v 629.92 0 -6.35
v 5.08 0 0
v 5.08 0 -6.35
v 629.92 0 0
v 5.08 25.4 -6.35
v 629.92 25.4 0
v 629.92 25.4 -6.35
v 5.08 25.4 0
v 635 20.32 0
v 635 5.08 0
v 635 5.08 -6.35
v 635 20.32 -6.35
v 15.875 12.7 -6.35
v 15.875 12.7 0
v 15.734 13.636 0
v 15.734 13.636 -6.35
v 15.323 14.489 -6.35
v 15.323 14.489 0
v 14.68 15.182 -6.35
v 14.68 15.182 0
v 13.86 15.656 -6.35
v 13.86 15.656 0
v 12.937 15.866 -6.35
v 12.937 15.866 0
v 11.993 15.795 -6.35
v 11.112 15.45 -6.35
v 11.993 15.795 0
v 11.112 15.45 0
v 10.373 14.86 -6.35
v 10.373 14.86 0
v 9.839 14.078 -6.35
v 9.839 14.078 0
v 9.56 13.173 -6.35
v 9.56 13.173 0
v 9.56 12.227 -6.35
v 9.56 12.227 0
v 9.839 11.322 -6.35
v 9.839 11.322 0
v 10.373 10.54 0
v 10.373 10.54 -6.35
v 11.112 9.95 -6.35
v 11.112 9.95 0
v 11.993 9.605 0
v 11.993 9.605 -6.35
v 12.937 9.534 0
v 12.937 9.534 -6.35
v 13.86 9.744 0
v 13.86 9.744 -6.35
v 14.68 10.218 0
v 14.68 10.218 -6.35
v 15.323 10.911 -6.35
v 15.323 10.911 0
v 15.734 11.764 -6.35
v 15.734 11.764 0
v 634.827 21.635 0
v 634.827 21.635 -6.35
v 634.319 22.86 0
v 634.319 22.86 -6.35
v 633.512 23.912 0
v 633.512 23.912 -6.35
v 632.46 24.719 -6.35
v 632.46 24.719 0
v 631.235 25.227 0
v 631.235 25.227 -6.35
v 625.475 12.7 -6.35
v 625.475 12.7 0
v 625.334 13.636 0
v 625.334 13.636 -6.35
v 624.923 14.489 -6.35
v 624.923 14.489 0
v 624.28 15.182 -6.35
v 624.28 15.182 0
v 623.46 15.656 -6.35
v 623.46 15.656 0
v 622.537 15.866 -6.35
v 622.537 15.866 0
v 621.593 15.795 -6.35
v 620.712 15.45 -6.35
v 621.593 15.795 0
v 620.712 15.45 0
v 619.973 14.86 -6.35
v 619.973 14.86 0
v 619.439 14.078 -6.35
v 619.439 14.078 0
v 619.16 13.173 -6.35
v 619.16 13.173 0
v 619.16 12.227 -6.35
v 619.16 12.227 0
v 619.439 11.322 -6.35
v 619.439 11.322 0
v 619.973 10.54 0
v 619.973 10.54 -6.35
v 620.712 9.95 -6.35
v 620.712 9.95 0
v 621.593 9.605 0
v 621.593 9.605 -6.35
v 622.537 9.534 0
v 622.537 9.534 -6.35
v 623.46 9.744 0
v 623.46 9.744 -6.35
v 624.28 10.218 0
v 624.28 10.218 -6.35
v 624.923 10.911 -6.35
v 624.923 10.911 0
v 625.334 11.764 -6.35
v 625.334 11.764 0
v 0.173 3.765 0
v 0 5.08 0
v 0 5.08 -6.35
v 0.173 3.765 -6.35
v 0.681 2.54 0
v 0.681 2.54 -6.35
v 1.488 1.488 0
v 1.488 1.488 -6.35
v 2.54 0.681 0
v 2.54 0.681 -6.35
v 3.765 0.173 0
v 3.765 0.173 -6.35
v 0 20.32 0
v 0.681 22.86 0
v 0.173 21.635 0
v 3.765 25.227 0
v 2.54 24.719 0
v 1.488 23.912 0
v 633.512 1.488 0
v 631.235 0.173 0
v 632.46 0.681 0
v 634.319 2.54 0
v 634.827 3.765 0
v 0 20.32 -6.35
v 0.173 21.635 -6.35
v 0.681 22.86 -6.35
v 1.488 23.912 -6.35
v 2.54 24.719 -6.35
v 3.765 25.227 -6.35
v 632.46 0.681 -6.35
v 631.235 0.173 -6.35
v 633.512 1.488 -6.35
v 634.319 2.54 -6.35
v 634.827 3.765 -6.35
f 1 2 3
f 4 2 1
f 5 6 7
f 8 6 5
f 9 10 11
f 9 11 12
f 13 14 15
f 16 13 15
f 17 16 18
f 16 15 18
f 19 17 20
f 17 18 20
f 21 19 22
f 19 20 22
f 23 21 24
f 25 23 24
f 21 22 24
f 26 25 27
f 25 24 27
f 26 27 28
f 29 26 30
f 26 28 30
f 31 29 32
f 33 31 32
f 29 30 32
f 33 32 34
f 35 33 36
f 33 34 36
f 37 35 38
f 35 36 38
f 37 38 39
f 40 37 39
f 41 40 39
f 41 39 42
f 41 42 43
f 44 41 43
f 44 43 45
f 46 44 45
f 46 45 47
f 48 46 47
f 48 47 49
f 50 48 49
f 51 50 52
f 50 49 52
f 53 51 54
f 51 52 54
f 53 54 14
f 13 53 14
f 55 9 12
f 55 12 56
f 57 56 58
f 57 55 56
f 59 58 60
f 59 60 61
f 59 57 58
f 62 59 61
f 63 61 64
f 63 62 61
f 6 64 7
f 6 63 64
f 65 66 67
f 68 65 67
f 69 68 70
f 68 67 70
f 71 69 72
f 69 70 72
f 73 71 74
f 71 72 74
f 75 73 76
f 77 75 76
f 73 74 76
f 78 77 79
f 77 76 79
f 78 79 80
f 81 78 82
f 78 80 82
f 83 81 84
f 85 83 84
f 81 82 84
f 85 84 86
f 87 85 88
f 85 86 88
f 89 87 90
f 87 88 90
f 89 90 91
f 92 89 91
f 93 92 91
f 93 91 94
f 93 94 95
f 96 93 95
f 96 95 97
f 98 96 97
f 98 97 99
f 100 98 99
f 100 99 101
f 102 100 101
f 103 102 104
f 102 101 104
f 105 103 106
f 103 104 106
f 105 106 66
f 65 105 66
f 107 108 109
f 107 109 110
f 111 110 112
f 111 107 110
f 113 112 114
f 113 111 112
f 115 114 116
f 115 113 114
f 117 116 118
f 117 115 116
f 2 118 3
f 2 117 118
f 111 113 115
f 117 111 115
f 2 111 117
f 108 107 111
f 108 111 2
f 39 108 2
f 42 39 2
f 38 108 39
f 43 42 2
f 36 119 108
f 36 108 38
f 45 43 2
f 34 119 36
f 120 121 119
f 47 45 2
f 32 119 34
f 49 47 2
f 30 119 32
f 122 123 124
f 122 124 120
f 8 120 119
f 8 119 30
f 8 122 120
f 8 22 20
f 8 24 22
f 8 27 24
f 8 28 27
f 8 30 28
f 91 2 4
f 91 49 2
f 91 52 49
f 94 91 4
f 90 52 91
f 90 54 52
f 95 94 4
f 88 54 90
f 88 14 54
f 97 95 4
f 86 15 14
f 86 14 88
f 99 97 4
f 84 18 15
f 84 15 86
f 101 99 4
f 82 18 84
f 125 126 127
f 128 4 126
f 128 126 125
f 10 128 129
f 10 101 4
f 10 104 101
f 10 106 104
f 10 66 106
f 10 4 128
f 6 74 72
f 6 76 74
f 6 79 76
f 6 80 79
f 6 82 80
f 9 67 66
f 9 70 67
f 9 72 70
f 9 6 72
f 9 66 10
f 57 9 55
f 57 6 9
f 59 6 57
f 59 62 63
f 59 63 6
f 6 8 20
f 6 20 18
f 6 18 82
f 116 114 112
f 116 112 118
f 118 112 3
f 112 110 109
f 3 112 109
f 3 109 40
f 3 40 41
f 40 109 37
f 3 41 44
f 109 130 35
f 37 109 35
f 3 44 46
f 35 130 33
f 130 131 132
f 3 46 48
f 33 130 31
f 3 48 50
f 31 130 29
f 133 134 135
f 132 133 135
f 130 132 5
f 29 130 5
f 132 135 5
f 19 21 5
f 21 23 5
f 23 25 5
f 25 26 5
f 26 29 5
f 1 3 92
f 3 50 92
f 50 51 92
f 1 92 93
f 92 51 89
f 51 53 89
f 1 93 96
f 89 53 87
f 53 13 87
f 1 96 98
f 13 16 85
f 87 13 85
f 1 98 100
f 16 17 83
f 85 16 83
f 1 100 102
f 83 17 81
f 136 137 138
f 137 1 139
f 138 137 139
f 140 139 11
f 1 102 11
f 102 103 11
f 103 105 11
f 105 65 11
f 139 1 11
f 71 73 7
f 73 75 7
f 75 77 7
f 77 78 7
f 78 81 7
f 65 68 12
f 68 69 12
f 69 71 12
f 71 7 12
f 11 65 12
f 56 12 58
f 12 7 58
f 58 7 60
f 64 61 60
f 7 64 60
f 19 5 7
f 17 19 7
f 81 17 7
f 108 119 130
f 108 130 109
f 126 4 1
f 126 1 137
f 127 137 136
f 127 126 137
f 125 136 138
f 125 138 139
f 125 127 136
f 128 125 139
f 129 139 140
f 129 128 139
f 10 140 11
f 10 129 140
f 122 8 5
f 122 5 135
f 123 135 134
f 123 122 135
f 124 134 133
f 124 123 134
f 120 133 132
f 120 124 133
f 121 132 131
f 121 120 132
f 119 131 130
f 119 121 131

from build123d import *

# Parameters (mm, degrees)
F0_R     = 3.175
F1_DEPTH = 6.35


with BuildPart() as f1:
    # F0 (on Top) → F1 (new body)
    with BuildSketch(Plane.XY):
        with BuildLine():
            ThreePointArc((0, 5.08), (1.487898, 1.487898), (5.08, 0))
            Line((5.08, 0), (629.92, 0))
            ThreePointArc((629.92, 0), (633.512102, 1.487898), (635, 5.08))
            Line((635, 5.08), (635, 20.32))
            ThreePointArc((635, 20.32), (633.512102, 23.912102), (629.92, 25.4))
            Line((629.92, 25.4), (5.08, 25.4))
            ThreePointArc((5.08, 25.4), (1.487898, 23.912102), (0, 20.32))
            Line((0, 20.32), (0, 5.08))
        make_face()
        with Locations((12.7, 12.7)):
            Circle(F0_R, mode=Mode.SUBTRACT)
        with Locations((622.3, 12.7)):
            Circle(F0_R, mode=Mode.SUBTRACT)
    extrude(amount=-F1_DEPTH)


solid = f1.part
